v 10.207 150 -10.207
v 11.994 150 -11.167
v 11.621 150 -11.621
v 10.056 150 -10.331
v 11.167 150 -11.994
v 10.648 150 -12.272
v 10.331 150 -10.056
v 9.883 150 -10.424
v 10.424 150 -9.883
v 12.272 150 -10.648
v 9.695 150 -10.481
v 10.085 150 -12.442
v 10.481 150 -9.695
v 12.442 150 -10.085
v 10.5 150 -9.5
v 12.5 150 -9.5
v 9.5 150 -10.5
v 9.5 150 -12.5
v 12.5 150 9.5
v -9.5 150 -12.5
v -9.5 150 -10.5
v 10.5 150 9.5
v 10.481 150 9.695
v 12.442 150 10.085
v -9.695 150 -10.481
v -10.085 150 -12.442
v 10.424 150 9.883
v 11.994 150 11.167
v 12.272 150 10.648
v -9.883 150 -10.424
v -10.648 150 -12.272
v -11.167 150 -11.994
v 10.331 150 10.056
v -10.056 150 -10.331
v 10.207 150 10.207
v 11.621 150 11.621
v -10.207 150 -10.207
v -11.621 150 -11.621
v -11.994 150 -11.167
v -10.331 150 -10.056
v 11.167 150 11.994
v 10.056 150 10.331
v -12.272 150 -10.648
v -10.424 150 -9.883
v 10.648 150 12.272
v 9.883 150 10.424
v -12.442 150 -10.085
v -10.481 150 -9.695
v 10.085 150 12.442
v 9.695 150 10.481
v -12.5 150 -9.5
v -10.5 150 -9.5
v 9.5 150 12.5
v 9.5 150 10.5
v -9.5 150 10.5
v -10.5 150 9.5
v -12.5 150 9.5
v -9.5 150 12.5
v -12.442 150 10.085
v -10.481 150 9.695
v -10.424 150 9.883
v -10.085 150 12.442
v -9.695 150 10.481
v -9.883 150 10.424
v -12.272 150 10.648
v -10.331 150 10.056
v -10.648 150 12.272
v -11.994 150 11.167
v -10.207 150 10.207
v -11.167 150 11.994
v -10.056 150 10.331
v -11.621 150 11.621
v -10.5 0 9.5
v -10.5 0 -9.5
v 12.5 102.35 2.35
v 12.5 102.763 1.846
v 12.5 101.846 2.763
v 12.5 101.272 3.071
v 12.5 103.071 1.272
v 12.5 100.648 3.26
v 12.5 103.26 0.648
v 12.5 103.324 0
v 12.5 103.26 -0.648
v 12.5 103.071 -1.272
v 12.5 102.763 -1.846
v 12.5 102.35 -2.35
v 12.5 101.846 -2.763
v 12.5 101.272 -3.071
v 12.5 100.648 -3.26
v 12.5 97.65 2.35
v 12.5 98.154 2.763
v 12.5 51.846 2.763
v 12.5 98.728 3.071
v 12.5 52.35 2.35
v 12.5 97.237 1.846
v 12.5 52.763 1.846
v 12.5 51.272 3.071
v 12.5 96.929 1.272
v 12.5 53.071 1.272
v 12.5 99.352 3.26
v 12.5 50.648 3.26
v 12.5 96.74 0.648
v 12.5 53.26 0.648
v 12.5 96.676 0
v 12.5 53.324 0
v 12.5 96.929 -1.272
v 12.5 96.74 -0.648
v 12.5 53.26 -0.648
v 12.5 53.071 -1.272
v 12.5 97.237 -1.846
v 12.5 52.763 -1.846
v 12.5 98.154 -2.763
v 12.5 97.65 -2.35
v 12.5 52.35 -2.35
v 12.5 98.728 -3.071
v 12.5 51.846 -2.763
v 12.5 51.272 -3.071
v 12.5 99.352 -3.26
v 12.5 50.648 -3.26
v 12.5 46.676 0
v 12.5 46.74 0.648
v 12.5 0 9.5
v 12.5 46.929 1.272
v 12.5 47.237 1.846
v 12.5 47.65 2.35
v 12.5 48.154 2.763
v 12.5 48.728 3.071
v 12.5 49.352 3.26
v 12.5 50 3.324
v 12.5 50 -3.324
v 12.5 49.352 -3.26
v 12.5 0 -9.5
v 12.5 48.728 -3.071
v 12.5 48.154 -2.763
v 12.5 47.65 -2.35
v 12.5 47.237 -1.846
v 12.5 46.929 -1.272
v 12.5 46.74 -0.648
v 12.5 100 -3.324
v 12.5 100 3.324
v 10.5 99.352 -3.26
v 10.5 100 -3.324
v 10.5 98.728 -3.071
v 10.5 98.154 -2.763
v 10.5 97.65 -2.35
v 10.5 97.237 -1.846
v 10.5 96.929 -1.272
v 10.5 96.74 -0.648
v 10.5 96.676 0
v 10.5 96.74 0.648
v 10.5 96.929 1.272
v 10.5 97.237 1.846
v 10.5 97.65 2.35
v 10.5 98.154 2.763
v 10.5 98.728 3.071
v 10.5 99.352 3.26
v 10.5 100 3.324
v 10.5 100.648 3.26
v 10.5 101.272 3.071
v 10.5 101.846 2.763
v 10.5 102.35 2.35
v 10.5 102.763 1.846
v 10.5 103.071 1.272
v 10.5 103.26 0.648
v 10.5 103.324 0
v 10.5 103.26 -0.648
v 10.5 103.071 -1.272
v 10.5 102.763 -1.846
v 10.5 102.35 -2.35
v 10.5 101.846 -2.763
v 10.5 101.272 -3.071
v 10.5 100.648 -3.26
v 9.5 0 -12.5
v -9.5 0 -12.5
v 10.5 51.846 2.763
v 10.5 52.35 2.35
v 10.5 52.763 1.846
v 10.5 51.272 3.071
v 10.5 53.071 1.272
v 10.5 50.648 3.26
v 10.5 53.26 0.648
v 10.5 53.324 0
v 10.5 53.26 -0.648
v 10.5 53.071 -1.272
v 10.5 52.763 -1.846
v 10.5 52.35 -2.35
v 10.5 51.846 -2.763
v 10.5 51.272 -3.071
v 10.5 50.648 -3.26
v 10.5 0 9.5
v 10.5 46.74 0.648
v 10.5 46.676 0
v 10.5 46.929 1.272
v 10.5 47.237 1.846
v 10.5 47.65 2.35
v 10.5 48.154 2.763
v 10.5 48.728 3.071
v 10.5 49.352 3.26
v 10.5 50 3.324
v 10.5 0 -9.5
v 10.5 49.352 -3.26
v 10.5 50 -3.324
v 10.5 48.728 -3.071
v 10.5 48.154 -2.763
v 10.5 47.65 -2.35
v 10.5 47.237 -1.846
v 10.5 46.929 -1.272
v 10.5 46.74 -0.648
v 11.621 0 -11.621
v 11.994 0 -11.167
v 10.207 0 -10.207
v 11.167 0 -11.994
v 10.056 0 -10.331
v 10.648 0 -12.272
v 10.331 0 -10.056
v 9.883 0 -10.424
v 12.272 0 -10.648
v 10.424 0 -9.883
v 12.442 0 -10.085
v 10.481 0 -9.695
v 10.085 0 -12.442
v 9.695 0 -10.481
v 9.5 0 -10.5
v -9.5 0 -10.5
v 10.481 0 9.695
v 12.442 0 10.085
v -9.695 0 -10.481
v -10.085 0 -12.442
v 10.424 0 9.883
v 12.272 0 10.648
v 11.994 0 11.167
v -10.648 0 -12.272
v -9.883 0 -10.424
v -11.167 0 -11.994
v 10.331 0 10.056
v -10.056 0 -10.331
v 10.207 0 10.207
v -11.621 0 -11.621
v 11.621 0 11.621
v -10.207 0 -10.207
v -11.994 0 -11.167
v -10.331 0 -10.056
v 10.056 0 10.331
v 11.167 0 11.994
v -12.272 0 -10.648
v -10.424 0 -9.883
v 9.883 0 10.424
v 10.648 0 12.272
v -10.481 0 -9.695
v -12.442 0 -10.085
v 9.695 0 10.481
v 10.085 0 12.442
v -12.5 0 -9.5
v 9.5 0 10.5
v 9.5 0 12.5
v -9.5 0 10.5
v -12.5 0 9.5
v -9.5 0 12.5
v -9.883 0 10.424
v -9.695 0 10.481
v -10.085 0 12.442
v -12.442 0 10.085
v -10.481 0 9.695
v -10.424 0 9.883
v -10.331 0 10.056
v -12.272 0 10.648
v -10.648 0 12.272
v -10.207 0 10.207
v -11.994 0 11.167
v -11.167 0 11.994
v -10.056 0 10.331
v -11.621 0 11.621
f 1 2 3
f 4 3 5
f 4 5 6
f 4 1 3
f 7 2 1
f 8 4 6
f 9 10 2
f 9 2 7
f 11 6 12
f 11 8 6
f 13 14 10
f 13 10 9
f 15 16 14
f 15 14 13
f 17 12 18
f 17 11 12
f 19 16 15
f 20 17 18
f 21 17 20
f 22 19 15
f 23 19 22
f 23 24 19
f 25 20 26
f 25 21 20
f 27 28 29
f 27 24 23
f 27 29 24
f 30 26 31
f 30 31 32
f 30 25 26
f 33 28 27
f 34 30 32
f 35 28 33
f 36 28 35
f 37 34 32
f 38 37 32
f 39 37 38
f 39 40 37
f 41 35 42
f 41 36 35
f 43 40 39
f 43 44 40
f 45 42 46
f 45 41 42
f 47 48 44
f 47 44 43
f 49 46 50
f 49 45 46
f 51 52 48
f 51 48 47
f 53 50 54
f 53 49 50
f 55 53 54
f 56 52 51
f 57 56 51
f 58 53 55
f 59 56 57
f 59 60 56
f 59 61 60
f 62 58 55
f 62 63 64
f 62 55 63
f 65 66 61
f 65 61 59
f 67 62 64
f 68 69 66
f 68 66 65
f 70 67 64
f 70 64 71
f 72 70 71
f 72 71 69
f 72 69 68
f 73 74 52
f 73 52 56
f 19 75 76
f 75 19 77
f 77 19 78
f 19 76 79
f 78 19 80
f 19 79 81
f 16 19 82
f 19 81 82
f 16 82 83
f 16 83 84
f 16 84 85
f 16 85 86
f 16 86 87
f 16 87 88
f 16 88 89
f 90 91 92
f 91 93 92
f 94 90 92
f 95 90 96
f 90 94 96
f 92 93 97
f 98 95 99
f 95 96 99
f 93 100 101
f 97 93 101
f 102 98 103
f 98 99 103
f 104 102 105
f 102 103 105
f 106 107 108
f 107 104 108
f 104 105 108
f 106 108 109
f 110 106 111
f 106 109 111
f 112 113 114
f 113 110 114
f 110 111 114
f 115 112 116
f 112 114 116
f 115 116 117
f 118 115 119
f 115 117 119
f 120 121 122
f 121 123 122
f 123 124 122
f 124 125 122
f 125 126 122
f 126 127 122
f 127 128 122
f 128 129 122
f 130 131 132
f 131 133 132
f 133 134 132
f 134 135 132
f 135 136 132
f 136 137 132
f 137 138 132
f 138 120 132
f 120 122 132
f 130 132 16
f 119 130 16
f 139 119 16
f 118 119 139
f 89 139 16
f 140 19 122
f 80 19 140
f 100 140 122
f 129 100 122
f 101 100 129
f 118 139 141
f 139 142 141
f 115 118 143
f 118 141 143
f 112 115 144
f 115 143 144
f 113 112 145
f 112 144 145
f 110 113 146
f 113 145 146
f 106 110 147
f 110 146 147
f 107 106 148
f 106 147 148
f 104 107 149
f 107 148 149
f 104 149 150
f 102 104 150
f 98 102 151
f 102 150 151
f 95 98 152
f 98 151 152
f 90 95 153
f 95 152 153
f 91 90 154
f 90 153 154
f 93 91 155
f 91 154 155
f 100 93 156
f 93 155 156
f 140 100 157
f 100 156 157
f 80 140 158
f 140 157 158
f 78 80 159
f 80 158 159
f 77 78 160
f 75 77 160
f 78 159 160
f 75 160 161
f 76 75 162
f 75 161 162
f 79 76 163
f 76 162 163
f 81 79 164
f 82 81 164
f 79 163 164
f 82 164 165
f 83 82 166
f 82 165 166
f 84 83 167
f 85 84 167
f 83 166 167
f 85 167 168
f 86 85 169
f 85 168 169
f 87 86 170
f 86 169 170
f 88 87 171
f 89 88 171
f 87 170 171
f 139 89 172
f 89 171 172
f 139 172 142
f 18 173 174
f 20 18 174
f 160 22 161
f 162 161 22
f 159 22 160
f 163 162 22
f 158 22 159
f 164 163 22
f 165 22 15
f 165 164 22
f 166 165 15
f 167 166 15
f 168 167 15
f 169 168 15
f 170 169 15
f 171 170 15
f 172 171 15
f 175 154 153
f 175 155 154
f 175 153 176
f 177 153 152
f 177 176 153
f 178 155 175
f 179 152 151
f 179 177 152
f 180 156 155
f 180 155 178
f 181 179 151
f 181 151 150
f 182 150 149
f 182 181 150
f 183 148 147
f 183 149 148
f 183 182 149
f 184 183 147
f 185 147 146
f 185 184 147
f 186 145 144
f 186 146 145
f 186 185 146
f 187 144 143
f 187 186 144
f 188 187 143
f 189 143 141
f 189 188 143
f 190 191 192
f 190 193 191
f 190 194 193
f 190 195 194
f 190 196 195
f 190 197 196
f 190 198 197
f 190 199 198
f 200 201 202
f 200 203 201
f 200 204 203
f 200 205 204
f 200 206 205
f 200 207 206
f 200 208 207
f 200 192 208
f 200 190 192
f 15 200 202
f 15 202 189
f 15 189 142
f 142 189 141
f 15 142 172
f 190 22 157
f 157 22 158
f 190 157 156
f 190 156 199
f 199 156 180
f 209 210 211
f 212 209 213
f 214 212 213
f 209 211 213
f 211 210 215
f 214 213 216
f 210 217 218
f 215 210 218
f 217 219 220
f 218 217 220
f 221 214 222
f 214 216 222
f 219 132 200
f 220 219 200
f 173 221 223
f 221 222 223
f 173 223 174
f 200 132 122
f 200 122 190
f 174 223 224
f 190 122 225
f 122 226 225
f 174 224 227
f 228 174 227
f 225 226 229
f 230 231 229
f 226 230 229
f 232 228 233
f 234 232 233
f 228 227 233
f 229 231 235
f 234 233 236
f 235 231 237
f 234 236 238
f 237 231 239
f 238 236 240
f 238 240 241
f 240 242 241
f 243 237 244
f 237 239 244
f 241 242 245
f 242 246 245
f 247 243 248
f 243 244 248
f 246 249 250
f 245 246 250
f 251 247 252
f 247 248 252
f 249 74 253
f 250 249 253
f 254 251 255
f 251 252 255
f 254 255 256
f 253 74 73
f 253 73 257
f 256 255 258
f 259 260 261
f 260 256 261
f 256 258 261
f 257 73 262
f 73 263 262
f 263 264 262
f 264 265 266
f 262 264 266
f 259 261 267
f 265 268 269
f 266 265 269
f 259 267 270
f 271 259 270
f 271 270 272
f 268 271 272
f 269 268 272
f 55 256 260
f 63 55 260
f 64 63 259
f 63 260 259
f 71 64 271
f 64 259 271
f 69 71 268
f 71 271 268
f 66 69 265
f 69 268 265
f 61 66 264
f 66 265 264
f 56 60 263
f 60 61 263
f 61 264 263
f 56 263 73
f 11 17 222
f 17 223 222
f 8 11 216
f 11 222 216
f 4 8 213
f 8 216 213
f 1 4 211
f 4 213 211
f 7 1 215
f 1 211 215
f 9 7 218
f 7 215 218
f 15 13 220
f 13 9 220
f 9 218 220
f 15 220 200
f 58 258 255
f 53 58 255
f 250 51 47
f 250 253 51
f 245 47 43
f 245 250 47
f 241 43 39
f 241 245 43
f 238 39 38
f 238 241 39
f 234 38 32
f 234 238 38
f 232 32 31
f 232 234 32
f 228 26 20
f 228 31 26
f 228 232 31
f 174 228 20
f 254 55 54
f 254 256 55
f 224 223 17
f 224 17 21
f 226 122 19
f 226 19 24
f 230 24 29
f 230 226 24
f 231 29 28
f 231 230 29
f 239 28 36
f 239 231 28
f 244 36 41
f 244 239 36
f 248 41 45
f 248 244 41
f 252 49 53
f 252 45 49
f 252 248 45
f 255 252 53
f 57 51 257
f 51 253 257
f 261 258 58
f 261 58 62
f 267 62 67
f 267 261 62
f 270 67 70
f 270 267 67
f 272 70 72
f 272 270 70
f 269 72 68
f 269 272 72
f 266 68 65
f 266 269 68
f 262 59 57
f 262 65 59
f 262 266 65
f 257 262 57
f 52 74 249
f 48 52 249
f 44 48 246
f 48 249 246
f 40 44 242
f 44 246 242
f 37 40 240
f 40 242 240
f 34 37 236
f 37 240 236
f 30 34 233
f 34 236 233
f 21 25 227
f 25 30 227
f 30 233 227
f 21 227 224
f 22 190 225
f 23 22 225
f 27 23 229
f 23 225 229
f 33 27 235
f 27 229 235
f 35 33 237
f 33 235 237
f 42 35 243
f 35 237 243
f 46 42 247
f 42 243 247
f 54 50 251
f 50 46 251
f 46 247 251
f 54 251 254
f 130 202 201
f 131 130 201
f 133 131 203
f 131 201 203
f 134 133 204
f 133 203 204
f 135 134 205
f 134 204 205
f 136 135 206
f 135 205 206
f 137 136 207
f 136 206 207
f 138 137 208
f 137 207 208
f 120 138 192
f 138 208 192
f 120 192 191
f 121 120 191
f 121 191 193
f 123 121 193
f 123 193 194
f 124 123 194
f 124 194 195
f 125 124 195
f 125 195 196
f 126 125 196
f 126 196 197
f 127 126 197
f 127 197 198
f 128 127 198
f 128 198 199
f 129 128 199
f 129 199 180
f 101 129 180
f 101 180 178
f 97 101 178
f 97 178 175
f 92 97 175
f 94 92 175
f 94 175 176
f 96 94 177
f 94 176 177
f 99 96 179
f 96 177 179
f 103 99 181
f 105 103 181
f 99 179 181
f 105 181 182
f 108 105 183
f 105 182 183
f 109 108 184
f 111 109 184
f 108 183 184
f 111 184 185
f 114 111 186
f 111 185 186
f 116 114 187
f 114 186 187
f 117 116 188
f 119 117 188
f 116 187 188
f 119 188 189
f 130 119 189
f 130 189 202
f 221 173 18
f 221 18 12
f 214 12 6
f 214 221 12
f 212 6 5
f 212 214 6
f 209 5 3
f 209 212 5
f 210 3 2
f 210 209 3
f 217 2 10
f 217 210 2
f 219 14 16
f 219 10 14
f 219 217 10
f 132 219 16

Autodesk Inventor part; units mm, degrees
ref_plane "XZ Plane" through (0, 0, 0) normal (0, 1, 0) x (-1, 0, 0)
sketch "Sketch1" plane through (0, 0, 0) normal (0, 1, 0) x (-1, 0, 0)
  line L0 (-9.5, 11.5) -> (9.5, 11.5) construction
  line L1 (11.5, 9.5) -> (11.5, -9.5) construction
  line L2 (9.5, -11.5) -> (-9.5, -11.5) construction
  line L3 (-11.5, -9.5) -> (-11.5, 9.5) construction
  line L4 (-11.5, 11.5) -> (11.5, -11.5) construction
  line L5 (11.5, 11.5) -> (-11.5, -11.5) construction
  arc A0 (11.5, 9.5) -> (9.5, 11.5) centre (9.5, 9.5) ccw construction
  arc A1 (9.5, -11.5) -> (11.5, -9.5) centre (9.5, -9.5) ccw construction
  arc A2 (-11.5, -9.5) -> (-9.5, -11.5) centre (-9.5, -9.5) ccw construction
  arc A3 (-9.5, 11.5) -> (-11.5, 9.5) centre (-9.5, 9.5) ccw construction
  line L6 (-9.5, -12.5) -> (9.5, -12.5)
  arc A4 (9.5, -12.5) -> (12.5, -9.5) centre (9.5, -9.5) ccw
  line L7 (12.5, -9.5) -> (12.5, 9.5)
  arc A5 (12.5, 9.5) -> (9.5, 12.5) centre (9.5, 9.5) ccw
  line L8 (9.5, 12.5) -> (-9.5, 12.5)
  arc A6 (-9.5, 12.5) -> (-12.5, 9.5) centre (-9.5, 9.5) ccw
  line L9 (-12.5, 9.5) -> (-12.5, -9.5)
  arc A7 (-12.5, -9.5) -> (-9.5, -12.5) centre (-9.5, -9.5) ccw
  line L10 (10.5, -9.5) -> (10.5, 9.5)
  arc A8 (10.5, 9.5) -> (9.5, 10.5) centre (9.5, 9.5) ccw
  line L11 (9.5, 10.5) -> (-9.5, 10.5)
  arc A9 (-9.5, 10.5) -> (-10.5, 9.5) centre (-9.5, 9.5) ccw
  line L12 (-10.5, 9.5) -> (-10.5, -9.5)
  arc A10 (-10.5, -9.5) -> (-9.5, -10.5) centre (-9.5, -9.5) ccw
  line L13 (-9.5, -10.5) -> (9.5, -10.5)
  arc A11 (9.5, -10.5) -> (10.5, -9.5) centre (9.5, -9.5) ccw
  point P0 (0, 0)
  point P1 (0, 0)
  point P2 (0, 0)
  dimension "d10" = 2
  dimension "depth" = 25
  dimension "width" = 25
  dimension "thickness" = 2
extrude "Extrusion1" add sketch "Sketch1" along normal blind 150
sketch "Sketch2" plane through (12.5, 0, 9.5) normal (1, 0, 0) x (0, 0, -1)
  line L0 (9.5, -30) -> (9.5, 180) construction
  line L1 (0, 150) -> (19, 150) projected
  point P0 (9.5, 0)
  point P1 (9.5, 100)
  point P2 (9.5, 50)
  dimension "d16" = 50
  dimension "d17" = 50
hole "Hole1" at (12.5, 100, 0) at (12.5, 50, 0) direction (-1, 0, 0) diameter 6.647 depth 20.2 tip angle 118 thread size "M8x1.25" class "6H" standard "ANSI Metric M Profile"
equation "\"d10\" = thickness"
properties part number "Stopa v2 profil 1" material "Steel"
